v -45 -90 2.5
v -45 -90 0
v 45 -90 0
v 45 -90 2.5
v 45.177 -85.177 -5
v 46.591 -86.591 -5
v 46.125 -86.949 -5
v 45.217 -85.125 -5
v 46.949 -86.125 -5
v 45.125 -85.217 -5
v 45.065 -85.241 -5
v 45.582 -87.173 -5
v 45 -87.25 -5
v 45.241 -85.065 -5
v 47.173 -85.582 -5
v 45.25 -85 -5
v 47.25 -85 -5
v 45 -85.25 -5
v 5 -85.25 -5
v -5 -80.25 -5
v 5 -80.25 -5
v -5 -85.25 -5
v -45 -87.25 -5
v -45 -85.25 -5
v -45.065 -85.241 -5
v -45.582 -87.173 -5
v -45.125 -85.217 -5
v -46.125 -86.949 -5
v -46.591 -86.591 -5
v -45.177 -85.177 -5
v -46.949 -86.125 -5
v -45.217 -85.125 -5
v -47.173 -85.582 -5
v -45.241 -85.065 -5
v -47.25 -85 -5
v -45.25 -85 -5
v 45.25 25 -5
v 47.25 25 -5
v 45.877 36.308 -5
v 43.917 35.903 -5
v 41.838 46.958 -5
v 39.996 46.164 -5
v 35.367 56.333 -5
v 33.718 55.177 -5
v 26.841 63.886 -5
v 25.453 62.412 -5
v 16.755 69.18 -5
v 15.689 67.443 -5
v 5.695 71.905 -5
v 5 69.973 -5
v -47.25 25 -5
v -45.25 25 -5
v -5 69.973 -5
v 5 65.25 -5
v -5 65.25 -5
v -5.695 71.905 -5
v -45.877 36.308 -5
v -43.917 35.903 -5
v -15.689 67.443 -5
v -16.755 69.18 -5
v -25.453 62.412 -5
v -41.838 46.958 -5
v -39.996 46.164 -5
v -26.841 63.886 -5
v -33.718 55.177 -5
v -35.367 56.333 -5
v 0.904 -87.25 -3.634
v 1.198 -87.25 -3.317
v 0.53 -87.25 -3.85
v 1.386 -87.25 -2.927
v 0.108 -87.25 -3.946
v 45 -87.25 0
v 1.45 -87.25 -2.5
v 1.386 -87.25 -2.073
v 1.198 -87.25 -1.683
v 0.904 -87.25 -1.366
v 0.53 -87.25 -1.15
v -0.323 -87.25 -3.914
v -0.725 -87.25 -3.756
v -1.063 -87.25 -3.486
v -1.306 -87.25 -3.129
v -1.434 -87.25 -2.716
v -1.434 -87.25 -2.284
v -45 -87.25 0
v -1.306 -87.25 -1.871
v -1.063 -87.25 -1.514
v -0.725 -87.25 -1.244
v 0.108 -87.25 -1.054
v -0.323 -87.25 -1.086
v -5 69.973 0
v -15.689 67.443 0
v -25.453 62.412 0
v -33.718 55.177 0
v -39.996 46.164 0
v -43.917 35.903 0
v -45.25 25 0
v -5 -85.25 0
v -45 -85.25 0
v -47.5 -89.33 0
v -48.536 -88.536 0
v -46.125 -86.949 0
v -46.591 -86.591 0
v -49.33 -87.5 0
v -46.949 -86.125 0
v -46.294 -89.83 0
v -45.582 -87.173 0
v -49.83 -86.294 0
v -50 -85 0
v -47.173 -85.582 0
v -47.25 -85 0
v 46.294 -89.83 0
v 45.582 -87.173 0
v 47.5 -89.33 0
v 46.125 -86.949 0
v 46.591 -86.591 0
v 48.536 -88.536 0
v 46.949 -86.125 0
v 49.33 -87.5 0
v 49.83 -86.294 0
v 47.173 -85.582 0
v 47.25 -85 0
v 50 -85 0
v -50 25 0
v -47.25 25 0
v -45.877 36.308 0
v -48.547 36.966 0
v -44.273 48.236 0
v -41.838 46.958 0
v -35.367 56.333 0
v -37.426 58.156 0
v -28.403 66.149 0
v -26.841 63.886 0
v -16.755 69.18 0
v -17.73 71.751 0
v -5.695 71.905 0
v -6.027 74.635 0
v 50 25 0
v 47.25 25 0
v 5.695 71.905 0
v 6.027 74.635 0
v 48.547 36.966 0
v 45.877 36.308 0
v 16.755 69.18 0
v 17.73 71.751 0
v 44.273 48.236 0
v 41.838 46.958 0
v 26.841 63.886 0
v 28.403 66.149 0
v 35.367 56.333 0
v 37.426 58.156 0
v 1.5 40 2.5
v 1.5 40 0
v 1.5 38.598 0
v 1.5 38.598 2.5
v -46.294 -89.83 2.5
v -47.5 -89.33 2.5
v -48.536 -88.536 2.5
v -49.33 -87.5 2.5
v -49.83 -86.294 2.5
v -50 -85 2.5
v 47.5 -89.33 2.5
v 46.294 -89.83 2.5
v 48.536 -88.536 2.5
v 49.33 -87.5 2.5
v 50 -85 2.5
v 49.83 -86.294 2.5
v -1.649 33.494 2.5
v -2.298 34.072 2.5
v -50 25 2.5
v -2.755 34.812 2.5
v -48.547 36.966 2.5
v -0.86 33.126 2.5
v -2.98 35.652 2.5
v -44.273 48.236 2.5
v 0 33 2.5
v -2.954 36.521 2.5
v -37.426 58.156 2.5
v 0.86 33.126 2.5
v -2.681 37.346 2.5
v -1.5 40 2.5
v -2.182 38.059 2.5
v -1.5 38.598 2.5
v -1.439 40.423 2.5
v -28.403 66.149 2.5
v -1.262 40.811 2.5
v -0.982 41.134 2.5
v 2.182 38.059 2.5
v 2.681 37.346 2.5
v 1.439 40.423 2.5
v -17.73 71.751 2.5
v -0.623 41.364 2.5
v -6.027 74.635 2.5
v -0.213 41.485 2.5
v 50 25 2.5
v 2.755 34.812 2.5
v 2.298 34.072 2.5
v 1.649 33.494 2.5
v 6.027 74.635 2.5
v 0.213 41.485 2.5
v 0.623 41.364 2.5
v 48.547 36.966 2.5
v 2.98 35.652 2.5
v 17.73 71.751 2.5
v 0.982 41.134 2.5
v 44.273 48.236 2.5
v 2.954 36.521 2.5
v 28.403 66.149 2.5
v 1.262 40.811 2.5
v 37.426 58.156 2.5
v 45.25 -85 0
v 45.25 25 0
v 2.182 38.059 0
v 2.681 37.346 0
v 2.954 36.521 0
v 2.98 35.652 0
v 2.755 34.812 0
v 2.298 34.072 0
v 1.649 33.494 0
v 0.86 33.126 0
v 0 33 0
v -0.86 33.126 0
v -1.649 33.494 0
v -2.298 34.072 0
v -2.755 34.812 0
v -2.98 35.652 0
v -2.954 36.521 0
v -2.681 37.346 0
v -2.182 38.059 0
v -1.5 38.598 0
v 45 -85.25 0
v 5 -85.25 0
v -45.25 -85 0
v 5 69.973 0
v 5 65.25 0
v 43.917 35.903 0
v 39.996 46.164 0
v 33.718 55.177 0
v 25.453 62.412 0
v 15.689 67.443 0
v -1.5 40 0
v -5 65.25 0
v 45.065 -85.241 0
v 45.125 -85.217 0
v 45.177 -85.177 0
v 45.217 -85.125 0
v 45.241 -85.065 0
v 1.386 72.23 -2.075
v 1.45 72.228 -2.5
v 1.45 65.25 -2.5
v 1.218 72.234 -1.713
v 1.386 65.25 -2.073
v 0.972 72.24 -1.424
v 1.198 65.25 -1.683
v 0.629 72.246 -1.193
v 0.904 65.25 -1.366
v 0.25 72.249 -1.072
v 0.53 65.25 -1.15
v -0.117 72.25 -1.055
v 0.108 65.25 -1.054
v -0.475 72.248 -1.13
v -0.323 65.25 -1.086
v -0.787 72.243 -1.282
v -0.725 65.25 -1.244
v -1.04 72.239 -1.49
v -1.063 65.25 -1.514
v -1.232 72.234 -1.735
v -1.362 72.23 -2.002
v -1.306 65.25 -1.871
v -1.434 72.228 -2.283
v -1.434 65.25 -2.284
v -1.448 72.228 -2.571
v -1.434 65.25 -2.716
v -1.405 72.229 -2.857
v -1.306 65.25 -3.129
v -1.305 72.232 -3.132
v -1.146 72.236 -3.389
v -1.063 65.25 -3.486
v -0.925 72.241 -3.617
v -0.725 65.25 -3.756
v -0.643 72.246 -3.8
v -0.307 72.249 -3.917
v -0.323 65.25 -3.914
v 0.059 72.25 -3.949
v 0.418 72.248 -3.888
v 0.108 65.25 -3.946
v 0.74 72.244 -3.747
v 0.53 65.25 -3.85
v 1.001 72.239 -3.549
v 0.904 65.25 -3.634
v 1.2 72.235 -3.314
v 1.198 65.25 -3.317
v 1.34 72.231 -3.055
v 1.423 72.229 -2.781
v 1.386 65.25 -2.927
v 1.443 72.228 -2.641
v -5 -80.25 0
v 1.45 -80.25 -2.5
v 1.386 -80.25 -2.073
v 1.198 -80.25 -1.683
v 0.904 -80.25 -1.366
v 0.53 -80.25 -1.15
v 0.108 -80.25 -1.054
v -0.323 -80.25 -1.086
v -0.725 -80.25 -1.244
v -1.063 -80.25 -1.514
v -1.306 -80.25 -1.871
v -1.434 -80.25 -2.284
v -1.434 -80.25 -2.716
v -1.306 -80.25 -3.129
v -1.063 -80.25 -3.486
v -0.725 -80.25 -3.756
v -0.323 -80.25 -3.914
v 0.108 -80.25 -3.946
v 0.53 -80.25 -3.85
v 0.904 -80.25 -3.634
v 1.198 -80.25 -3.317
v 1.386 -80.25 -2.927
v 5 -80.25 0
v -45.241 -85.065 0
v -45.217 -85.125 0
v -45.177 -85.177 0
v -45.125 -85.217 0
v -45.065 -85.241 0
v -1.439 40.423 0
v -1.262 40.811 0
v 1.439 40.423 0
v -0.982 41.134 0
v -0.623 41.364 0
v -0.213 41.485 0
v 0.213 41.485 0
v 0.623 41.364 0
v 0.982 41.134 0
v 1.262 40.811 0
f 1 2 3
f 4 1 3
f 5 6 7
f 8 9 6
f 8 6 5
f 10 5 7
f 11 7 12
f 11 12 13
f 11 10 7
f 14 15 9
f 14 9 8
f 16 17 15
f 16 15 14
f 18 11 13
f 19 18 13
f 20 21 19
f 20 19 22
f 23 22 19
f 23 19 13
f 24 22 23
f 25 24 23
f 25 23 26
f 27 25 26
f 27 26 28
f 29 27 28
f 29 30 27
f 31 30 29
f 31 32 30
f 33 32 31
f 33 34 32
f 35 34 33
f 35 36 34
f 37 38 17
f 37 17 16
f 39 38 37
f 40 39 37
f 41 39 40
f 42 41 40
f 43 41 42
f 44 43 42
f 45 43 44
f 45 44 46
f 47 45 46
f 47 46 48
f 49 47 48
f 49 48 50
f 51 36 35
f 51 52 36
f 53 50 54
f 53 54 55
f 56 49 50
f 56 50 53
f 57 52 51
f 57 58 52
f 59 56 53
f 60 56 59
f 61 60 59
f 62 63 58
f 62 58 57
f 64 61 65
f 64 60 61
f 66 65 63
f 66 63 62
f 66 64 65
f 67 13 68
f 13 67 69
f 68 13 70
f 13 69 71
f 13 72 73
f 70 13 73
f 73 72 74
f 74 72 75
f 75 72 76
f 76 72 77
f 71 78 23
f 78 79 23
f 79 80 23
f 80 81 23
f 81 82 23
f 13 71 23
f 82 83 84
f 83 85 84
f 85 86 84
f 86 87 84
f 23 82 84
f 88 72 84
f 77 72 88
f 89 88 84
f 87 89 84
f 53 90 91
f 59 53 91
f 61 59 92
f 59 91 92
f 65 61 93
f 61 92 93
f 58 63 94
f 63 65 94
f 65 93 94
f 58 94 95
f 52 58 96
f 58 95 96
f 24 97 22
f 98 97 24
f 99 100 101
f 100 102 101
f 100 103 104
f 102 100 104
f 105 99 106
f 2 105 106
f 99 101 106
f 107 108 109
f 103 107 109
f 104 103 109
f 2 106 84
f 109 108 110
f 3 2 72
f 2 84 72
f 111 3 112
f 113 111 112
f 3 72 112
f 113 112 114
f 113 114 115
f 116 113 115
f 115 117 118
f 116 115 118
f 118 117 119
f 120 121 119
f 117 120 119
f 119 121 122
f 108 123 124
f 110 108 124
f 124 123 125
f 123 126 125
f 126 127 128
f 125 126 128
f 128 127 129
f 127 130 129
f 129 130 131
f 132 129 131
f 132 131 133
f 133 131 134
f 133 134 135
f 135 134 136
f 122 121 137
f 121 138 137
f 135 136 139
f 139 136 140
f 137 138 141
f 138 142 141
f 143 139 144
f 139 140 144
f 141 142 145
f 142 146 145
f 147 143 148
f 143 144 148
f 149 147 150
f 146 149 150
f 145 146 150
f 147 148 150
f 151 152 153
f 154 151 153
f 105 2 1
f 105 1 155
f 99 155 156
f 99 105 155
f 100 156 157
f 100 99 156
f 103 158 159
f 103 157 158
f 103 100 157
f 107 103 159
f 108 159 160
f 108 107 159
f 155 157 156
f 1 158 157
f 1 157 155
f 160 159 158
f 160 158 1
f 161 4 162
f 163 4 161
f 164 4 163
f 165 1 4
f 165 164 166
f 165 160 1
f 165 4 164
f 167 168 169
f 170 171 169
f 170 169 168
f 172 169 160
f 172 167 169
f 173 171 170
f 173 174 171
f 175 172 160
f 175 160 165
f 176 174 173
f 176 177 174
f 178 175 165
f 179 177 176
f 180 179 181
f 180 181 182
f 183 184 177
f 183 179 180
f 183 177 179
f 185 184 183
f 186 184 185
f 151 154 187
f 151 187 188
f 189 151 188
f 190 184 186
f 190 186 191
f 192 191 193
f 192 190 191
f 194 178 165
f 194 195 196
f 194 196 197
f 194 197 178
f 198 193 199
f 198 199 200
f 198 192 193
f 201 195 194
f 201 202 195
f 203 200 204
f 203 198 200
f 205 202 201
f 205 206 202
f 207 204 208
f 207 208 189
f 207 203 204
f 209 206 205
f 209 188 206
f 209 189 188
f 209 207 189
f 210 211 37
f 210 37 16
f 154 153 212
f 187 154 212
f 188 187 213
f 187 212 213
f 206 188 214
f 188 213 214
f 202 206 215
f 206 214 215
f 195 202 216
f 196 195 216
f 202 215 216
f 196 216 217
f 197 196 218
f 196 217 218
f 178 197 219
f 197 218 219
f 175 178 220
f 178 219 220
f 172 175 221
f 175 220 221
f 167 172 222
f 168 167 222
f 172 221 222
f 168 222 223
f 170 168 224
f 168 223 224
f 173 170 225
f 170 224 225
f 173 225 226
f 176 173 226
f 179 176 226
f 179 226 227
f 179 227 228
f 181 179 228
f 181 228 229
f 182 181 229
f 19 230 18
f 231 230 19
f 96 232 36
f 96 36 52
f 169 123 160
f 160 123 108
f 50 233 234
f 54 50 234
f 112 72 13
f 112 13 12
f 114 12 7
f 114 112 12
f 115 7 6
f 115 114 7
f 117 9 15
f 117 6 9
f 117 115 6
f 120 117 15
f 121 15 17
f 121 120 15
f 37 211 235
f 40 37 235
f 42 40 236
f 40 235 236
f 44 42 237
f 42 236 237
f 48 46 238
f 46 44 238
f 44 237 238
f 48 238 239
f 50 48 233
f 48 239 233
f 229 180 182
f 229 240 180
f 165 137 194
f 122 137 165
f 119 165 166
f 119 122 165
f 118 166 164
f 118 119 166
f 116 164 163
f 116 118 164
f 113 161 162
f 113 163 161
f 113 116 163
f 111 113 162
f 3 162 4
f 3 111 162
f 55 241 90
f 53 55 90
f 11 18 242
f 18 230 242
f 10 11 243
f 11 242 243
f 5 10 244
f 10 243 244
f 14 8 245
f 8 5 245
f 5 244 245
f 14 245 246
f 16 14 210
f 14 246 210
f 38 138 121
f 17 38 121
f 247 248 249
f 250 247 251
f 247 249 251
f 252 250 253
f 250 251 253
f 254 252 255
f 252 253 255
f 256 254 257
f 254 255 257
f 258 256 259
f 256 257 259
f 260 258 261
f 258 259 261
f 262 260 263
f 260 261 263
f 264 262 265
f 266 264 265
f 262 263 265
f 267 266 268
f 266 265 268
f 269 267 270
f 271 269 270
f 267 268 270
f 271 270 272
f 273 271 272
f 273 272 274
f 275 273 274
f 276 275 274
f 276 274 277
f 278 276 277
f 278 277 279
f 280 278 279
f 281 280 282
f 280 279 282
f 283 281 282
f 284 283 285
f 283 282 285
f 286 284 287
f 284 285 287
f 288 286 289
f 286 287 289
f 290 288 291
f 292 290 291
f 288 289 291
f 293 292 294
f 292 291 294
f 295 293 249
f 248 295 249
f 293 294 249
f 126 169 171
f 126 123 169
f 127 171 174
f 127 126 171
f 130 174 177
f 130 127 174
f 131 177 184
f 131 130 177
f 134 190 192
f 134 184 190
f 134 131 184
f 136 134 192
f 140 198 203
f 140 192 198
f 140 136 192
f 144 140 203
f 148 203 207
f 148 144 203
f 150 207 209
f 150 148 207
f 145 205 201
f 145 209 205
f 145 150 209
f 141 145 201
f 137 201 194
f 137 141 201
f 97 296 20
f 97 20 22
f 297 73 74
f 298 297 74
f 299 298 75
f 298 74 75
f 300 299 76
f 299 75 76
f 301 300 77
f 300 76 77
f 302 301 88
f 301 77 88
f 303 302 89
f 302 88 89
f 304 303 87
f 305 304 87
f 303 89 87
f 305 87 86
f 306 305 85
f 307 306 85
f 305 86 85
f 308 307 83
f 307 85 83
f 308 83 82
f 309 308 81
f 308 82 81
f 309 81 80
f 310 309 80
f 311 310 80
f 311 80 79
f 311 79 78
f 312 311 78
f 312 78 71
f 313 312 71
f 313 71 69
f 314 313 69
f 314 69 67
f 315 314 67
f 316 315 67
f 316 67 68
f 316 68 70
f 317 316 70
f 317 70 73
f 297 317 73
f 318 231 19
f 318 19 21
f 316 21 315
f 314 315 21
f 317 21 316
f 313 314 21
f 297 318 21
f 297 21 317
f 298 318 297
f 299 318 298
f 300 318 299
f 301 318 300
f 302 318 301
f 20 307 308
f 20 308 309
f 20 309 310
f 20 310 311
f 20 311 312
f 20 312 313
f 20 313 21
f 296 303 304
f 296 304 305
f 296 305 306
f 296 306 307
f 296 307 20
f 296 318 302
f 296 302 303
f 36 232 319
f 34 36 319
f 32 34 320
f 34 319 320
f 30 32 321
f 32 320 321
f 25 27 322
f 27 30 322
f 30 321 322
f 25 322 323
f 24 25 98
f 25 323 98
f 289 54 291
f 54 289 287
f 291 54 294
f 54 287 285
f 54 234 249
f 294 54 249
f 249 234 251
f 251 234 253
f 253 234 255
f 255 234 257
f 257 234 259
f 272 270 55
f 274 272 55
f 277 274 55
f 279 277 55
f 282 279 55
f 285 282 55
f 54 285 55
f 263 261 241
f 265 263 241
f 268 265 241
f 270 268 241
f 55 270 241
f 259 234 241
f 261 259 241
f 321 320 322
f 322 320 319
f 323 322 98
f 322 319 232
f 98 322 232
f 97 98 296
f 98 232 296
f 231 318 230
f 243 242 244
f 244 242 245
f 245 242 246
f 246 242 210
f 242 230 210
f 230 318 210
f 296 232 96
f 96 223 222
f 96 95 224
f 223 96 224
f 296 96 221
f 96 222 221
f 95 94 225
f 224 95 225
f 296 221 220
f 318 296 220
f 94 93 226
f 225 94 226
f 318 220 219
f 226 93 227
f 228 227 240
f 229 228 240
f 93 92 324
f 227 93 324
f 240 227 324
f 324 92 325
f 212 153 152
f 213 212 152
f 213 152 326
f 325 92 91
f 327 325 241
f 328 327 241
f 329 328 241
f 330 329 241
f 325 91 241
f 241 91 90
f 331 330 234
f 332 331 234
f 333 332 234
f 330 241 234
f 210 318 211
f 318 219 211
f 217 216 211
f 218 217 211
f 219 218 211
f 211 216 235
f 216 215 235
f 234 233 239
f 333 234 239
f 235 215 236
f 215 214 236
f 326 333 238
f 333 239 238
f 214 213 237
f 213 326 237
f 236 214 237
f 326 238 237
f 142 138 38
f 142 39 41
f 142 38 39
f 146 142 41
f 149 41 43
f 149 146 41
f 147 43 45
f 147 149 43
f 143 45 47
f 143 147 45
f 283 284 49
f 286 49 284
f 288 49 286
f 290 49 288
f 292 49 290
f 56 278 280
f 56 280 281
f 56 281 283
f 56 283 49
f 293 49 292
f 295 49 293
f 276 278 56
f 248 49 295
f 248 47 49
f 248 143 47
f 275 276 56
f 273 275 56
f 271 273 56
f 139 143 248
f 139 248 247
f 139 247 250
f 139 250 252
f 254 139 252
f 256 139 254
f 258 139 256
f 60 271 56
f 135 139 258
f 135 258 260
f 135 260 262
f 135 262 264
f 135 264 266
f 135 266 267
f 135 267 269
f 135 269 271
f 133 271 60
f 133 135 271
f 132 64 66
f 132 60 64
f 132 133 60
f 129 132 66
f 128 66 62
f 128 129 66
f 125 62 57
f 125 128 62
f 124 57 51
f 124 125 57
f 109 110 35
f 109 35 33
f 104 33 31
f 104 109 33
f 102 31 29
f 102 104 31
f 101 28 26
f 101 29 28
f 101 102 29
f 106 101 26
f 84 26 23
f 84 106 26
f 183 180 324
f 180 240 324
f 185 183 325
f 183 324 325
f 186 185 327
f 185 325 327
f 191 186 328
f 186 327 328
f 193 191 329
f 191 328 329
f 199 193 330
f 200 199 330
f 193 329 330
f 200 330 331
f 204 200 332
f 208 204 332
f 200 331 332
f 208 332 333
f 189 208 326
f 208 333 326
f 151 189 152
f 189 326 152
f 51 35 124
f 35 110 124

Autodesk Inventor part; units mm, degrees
ref_plane "YZ Plane" through (0, 0, 0) normal (1, 0, 0) x (0, 1, 0)
ref_plane "XZ Plane" through (0, 0, 0) normal (0, 1, 0) x (-1, 0, 0)
ref_plane "XY Plane" through (0, 0, 0) normal (0, 0, 1) x (1, 0, 0)
sketch "Sketch1" plane through (0, 0, 0) normal (0, 0, 1) x (1, 0, 0)
  line L0 (50, -70) -> (50, 25)
  line L1 (-50, 25) -> (-50, -70)
  line L2 (0, 0) -> (-38.1854, 57.2781) construction
  arc A0 (50, 25) -> (-50, 25) centre (0, 25) ccw
  line L3 (-45, -90) -> (45, -90)
  line L4 (0, 0) -> (38.1854, 57.2781) construction
  line L5 (50, -70) -> (50, -85)
  line L6 (-50, -70) -> (-50, -85)
  arc A1 (45, -90) -> (50, -85) centre (45, -85) ccw
  arc A2 (-50, -85) -> (-45, -90) centre (-45, -85) ccw
  line L7 (-47.25, 25) -> (-47.25, -70)
  line L8 (-47.25, -70) -> (-47.25, -85)
  arc A3 (-47.25, -85) -> (-45, -87.25) centre (-45, -85) ccw
  line L9 (-45, -87.25) -> (45, -87.25)
  arc A4 (45, -87.25) -> (47.25, -85) centre (45, -85) ccw
  line L10 (47.25, -85) -> (47.25, -70)
  line L11 (47.25, -70) -> (47.25, 25)
  arc A5 (47.25, 25) -> (-47.25, 25) centre (0, 25) ccw
  dimension "d0" = 5
  dimension "d1" = 2.75
extrude "Extrusion1" add sketch "Sketch1" along normal blind 2.5 contours L5 A1 L3 A2 L6 L1 A0 L0 | A5 L11 L10 A4 L9 A3 L8 L7
sketch "Sketch2" plane through (0, 0, 0) normal (0, 0, -1) x (-1, 0, 0)
  line L0 (50, -70) -> (50, 25)
  line L1 (-50, 25) -> (-50, -70)
  line L2 (0, 0) -> (-38.1854, 57.2781) construction
  arc A0 (50, 25) -> (-50, 25) centre (0, 25) ccw
  line L3 (-45, -90) -> (45, -90)
  line L4 (0, 0) -> (38.1854, 57.2781) construction
  line L5 (50, -70) -> (50, -85)
  line L6 (-50, -70) -> (-50, -85)
  arc A1 (45, -90) -> (50, -85) centre (45, -85) ccw
  arc A2 (-50, -85) -> (-45, -90) centre (-45, -85) ccw
  line L7 (-47.25, 25) -> (-47.25, -70)
  line L8 (-47.25, -70) -> (-47.25, -85)
  arc A3 (-47.25, -85) -> (-45, -87.25) centre (-45, -85) ccw
  line L9 (-45, -87.25) -> (45, -87.25)
  arc A4 (45, -87.25) -> (47.25, -85) centre (45, -85) ccw
  line L10 (47.25, -85) -> (47.25, -70)
  line L11 (47.25, -70) -> (47.25, 25)
  arc A5 (47.25, 25) -> (-47.25, 25) centre (0, 25) ccw
  line L12 (-45.25, 25) -> (-45.25, -70)
  line L13 (-45.25, -70) -> (-45.25, -85)
  arc A6 (-45.25, -85) -> (-45, -85.25) centre (-45, -85) ccw
  line L14 (-45, -85.25) -> (45, -85.25)
  arc A7 (45, -85.25) -> (45.25, -85) centre (45, -85) ccw
  line L15 (45.25, -85) -> (45.25, -70)
  line L16 (45.25, -70) -> (45.25, 25)
  arc A8 (45.25, 25) -> (-45.25, 25) centre (0, 25) ccw
  line L17 (-5, -80.25) -> (5, -80.25)
  line L18 (-5, -85.25) -> (-5, -80.25)
  line L19 (5, -80.25) -> (5, -85.25)
  line L20 (-5, 65.25) -> (5, 65.25)
  line L21 (-5, 69.9729) -> (-5, 65.25)
  line L22 (5, 65.25) -> (5, 69.9729)
  dimension "d4" = 5
  dimension "d5" = 2.75
  dimension "d6" = 2
extrude "Extrusion2" add sketch "Sketch2" along normal blind 5 contours A5 L11 L10 A4 L9 A3 L8 L7 | A8 L22 L20 L21 | L18 L17 L19 L14
sketch "Sketch3" plane through (-45, -87.25, 0) normal (0, -1, 0) x (1, 0, 0)
  line L0 (45, 0) -> (45, -5)
  line L1 (-2.25, -5) -> (92.25, -5) projected
  circle A0 centre (45, -2.5) radius 1.45
  line L2 (0, 0) -> (90, 0) projected
  dimension "d10" = 2.9
  dimension "d16" = 5
extrude "Extrusion3" cut sketch "Sketch3" against normal through all
sketch "Sketch4" plane through (0, 0, 0) normal (0, 0, -1) x (-1, 0, 0)
  arc A0 (-1.5, 38.5981) -> (1.5, 38.5981) centre (0, 36) ccw
  arc A1 (1.5, 40) -> (-1.5, 40) centre (0, 40) ccw
  line L0 (-1.5, 40) -> (-1.5, 38.5981)
  line L1 (1.5, 40) -> (1.5, 38.5981)
  point P0 (0, 0)
  dimension "d13" = 3
extrude "Extrusion4" cut sketch "Sketch4" against normal blind 10
properties part number "lid"
